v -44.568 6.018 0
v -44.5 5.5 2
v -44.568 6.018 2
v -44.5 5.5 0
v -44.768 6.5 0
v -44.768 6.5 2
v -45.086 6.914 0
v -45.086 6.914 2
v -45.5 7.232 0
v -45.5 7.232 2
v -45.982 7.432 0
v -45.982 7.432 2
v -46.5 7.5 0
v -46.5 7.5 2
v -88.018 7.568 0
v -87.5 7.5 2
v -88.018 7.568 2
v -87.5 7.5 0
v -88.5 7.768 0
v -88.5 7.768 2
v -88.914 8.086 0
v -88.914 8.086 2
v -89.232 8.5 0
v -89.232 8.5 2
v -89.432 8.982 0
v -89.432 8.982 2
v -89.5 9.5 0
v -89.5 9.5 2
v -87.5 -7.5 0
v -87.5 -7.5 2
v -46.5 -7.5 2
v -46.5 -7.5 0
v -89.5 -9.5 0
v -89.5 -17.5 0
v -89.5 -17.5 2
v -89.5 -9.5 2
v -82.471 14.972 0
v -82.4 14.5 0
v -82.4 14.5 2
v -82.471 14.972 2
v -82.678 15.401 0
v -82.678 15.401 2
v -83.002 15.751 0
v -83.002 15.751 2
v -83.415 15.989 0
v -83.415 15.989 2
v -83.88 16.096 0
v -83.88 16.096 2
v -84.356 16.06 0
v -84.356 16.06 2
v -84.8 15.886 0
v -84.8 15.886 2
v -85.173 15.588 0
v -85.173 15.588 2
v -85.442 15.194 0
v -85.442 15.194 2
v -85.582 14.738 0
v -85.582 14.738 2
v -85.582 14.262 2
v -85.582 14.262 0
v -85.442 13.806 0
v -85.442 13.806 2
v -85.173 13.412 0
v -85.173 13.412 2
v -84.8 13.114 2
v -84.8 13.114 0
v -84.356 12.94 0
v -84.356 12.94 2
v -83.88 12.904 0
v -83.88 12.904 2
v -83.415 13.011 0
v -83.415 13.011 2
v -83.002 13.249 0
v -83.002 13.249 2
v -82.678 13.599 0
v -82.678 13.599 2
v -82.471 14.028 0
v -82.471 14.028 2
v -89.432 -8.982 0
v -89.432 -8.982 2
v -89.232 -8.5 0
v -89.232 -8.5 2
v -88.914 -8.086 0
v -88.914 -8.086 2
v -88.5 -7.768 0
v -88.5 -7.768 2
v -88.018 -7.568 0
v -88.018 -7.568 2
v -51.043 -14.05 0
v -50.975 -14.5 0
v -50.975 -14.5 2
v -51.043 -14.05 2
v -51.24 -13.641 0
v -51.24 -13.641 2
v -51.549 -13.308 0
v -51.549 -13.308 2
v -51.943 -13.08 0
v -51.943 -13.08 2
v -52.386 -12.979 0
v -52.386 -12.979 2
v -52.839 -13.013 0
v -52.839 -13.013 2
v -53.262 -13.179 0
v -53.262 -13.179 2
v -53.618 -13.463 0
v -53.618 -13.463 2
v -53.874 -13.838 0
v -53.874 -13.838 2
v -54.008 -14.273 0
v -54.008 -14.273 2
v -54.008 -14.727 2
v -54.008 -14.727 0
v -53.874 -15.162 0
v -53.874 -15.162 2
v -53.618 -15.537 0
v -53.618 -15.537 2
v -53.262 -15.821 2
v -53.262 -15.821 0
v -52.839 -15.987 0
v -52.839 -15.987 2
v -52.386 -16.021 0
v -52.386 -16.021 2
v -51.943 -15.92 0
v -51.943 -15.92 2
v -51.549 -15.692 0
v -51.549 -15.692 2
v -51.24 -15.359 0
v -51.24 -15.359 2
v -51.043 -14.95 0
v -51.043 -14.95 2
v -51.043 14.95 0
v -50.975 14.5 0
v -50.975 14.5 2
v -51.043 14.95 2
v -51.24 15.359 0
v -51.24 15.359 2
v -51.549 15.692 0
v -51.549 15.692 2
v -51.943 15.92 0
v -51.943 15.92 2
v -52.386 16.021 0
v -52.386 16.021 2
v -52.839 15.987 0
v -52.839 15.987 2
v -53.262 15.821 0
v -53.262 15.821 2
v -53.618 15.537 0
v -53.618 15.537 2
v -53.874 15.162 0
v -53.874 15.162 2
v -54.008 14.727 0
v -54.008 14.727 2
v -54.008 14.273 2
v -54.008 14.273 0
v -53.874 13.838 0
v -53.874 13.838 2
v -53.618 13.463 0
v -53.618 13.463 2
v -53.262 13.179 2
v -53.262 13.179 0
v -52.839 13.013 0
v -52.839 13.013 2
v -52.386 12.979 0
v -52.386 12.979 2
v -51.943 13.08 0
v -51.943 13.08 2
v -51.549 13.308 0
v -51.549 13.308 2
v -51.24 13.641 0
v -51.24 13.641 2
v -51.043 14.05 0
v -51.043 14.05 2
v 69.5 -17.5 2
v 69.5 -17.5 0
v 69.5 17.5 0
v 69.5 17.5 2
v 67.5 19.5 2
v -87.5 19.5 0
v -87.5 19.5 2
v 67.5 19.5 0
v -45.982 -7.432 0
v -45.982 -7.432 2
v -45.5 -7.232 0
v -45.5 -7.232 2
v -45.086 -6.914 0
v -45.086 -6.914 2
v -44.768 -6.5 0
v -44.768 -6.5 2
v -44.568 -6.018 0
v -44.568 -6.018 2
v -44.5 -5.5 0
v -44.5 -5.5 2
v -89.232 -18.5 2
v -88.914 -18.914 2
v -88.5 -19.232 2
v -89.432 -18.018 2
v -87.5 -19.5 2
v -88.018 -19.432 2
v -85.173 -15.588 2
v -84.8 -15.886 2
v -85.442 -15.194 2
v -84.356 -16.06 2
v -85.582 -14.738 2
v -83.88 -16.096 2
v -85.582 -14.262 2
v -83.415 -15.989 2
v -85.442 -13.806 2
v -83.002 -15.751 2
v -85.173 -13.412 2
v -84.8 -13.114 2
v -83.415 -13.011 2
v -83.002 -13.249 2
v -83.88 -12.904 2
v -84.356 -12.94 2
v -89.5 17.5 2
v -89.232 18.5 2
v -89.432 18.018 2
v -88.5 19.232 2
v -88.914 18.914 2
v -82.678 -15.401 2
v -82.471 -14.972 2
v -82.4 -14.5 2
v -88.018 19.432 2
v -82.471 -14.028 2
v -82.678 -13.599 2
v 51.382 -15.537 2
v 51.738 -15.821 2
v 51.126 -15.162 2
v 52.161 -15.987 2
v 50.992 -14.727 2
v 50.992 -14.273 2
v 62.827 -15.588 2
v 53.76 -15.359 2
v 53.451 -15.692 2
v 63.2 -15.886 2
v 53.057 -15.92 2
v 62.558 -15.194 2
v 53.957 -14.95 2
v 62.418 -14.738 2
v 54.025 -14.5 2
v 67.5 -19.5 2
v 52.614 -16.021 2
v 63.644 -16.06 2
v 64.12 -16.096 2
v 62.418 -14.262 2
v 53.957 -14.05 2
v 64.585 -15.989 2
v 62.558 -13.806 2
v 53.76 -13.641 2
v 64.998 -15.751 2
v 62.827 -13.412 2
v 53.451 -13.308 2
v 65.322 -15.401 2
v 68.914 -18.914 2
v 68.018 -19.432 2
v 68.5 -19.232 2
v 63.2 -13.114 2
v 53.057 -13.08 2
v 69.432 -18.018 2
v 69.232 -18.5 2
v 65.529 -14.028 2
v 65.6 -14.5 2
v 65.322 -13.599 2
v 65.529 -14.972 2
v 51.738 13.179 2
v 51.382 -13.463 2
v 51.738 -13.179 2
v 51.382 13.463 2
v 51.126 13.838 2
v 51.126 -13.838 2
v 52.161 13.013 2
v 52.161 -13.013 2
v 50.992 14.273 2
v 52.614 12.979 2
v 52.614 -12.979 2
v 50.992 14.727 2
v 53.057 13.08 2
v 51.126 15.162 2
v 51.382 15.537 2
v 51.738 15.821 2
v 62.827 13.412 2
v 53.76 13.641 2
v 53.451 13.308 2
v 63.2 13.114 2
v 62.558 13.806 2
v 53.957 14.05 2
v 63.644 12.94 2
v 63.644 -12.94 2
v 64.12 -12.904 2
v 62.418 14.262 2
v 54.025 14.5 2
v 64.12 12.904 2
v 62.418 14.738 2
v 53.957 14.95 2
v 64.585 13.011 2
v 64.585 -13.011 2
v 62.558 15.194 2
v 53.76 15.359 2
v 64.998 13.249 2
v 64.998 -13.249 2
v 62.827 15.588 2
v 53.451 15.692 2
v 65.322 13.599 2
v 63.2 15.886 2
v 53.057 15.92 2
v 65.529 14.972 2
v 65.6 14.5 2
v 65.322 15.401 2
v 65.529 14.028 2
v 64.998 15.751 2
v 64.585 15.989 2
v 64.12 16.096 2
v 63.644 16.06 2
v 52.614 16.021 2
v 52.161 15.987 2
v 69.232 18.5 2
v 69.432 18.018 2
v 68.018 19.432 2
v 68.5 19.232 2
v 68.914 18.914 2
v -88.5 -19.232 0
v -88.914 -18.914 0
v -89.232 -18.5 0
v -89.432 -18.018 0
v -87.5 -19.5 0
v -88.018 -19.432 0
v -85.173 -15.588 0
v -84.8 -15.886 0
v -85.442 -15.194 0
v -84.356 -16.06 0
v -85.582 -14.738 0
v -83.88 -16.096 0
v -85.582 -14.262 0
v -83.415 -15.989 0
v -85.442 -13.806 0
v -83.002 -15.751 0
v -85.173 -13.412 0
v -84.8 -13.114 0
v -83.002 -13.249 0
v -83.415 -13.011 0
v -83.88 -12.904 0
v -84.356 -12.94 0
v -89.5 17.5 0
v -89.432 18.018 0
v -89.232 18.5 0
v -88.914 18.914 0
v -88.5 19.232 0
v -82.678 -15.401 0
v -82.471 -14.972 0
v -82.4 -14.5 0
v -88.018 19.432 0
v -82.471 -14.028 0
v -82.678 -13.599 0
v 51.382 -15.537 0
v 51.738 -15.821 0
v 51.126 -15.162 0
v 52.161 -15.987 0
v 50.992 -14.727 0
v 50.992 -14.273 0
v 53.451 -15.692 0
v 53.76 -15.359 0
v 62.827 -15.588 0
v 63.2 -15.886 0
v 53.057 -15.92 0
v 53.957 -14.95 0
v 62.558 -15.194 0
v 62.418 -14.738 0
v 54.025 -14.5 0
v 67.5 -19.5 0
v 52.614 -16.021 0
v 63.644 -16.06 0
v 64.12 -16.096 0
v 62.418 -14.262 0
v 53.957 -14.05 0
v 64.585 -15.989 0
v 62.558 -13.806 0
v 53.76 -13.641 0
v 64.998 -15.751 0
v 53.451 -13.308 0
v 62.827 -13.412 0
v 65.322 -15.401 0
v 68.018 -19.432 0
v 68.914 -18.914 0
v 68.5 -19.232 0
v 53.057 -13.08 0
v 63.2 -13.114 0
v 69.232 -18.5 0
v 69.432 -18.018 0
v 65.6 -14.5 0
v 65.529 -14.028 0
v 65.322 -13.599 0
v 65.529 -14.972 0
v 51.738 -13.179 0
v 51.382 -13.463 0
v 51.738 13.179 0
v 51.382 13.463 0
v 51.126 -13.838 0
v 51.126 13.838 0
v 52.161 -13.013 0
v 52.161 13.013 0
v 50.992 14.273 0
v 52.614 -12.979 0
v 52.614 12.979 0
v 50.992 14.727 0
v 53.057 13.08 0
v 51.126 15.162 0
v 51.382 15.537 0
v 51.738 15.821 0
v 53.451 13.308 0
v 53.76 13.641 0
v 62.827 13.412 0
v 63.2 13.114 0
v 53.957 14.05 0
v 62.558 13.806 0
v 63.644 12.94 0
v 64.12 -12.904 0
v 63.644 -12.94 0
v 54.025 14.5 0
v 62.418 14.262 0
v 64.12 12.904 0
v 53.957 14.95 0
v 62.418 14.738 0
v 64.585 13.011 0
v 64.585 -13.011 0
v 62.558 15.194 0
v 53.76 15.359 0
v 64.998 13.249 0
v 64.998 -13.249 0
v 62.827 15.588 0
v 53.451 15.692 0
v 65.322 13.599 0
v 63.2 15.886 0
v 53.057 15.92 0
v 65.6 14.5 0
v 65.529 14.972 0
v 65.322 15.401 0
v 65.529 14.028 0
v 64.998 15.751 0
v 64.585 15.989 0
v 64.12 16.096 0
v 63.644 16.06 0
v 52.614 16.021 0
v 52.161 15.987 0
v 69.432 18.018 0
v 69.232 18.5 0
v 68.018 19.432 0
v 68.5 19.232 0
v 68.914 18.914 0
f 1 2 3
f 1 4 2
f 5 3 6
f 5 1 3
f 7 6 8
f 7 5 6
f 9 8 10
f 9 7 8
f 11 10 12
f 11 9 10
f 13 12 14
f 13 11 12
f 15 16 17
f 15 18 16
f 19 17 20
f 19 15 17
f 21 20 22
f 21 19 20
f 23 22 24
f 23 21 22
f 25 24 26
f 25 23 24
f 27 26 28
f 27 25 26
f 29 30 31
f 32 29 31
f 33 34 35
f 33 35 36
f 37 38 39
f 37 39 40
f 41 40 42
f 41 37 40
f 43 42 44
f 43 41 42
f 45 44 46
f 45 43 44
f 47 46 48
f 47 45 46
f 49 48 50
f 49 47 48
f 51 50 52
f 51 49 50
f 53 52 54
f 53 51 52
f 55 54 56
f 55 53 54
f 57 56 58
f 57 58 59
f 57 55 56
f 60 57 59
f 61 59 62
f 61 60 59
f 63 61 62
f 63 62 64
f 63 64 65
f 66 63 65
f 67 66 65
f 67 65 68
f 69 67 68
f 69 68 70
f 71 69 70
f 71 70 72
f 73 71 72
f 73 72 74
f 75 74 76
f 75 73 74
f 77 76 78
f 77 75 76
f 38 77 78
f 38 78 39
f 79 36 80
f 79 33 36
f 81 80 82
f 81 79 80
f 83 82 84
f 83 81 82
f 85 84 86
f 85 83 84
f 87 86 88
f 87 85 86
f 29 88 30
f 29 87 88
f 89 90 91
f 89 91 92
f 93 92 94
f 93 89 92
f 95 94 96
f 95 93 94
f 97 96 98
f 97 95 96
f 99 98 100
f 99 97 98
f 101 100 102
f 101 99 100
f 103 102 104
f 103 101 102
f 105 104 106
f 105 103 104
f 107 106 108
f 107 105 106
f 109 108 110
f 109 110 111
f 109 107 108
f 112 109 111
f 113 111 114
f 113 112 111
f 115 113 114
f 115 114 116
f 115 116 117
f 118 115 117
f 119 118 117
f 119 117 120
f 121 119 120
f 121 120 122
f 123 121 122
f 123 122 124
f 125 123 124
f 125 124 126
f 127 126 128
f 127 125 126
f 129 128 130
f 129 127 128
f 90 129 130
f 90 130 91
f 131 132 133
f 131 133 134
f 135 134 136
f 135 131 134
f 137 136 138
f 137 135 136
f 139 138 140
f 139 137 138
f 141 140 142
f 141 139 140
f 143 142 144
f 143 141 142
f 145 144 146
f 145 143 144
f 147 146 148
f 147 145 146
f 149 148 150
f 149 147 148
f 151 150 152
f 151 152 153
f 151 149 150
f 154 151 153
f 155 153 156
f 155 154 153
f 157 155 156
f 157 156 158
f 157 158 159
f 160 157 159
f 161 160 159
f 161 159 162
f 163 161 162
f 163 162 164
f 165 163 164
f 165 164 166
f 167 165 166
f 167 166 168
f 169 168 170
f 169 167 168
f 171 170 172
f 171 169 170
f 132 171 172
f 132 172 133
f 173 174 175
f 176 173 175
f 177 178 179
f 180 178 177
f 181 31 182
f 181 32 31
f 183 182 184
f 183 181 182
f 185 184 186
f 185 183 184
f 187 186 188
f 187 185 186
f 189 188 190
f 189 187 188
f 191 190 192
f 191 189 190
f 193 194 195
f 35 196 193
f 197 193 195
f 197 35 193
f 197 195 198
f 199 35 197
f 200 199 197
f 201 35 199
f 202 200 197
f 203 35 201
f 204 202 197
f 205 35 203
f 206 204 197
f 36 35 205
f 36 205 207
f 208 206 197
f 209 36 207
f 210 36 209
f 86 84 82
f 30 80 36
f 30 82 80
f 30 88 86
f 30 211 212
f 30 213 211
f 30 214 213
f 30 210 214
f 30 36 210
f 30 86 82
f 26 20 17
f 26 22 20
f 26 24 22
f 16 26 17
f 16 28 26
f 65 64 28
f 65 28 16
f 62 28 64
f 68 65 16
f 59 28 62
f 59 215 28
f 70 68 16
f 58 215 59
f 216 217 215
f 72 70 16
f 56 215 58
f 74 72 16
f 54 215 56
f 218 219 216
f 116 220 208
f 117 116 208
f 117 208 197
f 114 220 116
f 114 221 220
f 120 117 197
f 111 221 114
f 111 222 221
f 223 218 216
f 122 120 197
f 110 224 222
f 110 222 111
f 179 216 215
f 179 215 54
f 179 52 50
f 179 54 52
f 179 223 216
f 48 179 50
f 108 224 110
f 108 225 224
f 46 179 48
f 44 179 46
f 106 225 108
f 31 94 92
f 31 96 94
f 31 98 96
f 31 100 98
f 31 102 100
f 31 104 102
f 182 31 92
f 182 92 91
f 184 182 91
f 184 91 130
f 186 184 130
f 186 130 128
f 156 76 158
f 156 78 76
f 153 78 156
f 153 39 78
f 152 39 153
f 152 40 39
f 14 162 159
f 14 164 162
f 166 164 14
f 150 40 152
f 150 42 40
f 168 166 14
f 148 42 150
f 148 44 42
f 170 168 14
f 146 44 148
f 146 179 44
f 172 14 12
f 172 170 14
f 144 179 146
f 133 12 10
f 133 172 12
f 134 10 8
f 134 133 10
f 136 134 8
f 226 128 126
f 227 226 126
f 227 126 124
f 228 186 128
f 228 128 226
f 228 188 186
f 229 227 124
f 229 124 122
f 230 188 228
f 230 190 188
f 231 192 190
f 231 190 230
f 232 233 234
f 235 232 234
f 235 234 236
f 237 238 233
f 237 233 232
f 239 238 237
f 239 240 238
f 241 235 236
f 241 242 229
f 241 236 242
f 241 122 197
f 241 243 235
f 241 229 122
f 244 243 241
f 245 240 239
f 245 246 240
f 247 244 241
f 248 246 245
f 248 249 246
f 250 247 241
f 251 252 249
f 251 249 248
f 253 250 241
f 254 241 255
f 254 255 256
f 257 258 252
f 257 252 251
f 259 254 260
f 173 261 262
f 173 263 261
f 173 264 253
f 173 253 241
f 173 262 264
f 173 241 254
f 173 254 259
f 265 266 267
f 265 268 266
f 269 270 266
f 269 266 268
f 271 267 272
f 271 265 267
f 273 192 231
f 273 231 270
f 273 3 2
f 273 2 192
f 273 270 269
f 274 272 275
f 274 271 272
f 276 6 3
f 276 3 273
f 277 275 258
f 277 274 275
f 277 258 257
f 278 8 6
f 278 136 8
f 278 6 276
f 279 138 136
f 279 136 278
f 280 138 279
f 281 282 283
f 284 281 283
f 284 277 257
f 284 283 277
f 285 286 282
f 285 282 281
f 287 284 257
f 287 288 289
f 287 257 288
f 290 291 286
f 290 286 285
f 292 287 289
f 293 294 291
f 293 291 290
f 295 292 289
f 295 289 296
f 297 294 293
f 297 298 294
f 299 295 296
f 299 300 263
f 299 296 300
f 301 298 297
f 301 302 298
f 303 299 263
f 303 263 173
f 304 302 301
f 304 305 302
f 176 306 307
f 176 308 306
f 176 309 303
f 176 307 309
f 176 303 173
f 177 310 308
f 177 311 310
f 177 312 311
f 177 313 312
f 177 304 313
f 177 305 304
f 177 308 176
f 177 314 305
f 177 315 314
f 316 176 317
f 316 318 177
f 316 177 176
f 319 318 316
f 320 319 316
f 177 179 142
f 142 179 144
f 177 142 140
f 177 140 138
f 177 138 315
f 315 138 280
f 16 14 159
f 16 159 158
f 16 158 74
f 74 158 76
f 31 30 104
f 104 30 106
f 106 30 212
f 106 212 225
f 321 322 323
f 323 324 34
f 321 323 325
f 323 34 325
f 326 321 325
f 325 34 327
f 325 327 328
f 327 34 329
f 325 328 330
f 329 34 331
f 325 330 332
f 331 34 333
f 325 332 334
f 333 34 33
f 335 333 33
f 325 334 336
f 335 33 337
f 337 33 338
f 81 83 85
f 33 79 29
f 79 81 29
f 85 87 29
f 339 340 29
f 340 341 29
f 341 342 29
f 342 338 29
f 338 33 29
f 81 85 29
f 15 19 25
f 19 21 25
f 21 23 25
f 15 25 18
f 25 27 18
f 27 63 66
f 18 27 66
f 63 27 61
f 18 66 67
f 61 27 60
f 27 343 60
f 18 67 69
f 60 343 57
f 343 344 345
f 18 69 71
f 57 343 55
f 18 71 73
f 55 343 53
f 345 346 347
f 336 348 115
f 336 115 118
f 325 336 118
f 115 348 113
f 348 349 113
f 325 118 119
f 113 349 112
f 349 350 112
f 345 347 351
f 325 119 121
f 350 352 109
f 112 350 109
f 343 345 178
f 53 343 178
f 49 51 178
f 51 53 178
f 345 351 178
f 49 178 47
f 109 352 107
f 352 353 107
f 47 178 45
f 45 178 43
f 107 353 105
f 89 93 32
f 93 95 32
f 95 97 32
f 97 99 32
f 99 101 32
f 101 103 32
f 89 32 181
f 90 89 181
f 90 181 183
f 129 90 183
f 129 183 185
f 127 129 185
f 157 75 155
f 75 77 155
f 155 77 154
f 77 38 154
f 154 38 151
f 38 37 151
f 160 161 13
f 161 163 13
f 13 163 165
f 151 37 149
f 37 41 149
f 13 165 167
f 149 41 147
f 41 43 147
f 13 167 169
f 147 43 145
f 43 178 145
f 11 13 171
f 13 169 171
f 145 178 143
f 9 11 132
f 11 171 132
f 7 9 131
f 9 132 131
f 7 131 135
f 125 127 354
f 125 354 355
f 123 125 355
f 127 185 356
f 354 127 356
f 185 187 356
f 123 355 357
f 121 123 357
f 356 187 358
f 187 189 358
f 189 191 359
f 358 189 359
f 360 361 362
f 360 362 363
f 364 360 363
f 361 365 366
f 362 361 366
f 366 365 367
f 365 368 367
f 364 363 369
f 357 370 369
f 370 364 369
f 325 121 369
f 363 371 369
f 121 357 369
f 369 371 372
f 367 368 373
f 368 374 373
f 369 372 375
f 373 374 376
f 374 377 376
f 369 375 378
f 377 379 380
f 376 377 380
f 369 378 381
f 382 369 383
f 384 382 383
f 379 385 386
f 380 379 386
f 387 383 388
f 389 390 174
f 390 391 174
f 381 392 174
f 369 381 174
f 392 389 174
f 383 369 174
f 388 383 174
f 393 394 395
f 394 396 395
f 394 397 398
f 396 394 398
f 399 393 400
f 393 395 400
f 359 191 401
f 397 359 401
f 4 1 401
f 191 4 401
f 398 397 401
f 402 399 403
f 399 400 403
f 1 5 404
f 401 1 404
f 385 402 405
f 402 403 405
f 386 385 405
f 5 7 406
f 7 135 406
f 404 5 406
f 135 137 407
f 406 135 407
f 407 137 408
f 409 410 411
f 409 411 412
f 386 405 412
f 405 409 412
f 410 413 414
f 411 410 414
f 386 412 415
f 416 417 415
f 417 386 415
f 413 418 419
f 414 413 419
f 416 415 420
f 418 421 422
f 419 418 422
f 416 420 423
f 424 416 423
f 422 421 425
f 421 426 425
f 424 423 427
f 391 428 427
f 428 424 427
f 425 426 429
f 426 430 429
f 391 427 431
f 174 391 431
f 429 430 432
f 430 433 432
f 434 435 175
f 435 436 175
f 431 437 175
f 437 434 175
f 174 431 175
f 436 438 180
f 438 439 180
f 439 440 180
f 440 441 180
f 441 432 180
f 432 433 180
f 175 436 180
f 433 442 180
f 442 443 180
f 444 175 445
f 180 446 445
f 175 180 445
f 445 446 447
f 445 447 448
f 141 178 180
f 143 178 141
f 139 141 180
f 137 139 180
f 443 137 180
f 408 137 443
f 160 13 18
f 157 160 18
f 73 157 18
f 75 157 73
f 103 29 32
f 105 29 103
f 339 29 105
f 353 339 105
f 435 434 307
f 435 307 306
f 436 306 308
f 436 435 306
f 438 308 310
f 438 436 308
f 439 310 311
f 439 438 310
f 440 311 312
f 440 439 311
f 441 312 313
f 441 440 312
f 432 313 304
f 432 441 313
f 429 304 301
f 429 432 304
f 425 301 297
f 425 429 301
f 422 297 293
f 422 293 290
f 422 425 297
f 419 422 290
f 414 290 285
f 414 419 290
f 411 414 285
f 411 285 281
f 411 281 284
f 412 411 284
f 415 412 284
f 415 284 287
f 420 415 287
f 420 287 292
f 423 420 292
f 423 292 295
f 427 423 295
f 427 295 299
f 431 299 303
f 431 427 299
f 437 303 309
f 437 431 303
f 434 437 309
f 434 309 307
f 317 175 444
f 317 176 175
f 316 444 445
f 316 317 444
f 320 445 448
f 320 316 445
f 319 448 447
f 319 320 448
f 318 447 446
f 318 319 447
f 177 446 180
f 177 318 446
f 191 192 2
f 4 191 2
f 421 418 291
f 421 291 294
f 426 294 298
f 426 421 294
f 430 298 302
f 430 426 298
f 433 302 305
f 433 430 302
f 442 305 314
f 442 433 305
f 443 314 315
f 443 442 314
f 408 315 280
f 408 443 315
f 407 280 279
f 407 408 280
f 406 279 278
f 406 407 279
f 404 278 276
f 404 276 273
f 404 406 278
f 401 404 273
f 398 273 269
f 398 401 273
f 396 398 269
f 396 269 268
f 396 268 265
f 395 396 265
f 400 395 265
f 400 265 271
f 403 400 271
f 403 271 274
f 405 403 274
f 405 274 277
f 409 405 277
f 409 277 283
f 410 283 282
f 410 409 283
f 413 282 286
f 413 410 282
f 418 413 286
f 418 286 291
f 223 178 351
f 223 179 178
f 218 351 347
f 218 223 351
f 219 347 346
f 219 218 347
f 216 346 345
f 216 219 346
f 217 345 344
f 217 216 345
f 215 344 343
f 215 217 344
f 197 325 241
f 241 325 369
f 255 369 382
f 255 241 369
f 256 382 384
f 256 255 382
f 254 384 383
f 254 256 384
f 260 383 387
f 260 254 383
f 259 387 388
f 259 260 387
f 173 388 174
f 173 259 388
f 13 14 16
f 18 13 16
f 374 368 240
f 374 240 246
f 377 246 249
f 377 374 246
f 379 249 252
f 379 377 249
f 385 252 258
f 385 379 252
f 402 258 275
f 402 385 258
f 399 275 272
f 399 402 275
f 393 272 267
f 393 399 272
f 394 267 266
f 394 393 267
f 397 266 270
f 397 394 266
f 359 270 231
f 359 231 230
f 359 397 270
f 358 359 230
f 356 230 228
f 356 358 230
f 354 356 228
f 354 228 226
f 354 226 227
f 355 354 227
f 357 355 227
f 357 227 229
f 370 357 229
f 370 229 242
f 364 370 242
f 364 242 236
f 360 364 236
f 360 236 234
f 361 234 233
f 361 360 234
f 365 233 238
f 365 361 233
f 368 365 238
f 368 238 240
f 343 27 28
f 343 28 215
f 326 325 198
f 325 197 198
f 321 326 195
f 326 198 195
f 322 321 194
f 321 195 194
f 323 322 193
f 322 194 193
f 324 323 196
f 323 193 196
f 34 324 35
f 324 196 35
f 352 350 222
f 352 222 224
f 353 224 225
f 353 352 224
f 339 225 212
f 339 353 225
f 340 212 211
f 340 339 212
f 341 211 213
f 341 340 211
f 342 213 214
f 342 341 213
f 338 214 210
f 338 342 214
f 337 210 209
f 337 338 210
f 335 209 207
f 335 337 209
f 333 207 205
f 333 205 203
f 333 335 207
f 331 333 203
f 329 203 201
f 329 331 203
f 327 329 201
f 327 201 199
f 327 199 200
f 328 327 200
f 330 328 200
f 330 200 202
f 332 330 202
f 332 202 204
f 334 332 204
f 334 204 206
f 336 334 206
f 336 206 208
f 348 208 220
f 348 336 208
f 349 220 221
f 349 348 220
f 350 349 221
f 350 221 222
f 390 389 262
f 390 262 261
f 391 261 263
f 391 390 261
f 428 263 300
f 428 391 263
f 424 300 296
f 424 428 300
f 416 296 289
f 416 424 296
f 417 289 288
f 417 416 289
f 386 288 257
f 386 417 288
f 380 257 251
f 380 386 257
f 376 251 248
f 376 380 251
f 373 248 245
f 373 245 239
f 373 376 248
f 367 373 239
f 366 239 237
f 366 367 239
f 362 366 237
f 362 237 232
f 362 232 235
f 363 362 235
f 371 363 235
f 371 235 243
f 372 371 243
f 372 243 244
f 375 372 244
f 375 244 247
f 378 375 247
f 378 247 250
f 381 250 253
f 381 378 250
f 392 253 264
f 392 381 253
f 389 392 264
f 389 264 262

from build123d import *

# Parameters (mm, degrees)
SKETCH_1_W          = 32
SKETCH_1_H          = 39
SKETCH_1_R          = 1.6
SKETCH_1_W_2        = 115
SKETCH_1_R_2        = 1.525
SKETCH_1_W_3        = 12
EXTRUDE_1_DEPTH     = 2
SKETCH_2_W          = 19
SKETCH_2_H          = 15
SKETCH_2_W_2        = 26
CUT_EXTRUDE_1_DEPTH = 10
FILLET_1_R          = 2


with BuildPart() as part:
    # 草图1 → 凸台-拉伸1 (new body)
    # profile 1 of 3: a face of its own
    with BuildSketch(Plane.XY):
        with Locations((-73.5, 0)):
            Rectangle(SKETCH_1_W, SKETCH_1_H)
        with Locations((-84, -14.5)):
            Circle(SKETCH_1_R, mode=Mode.SUBTRACT)
        with Locations((-84, 14.5)):
            Circle(SKETCH_1_R, mode=Mode.SUBTRACT)
    # profile 2 of 3: a face of its own
    with BuildSketch(Plane.XY):
        Rectangle(SKETCH_1_W_2, SKETCH_1_H)
        with Locations((52.5, 14.5)):
            Circle(SKETCH_1_R_2, mode=Mode.SUBTRACT)
        with Locations((52.5, -14.5)):
            Circle(SKETCH_1_R_2, mode=Mode.SUBTRACT)
        with Locations((-52.5, -14.5)):
            Circle(SKETCH_1_R_2, mode=Mode.SUBTRACT)
        with Locations((-52.5, 14.5)):
            Circle(SKETCH_1_R_2, mode=Mode.SUBTRACT)
    # profile 3 of 3: a face of its own
    with BuildSketch(Plane.XY):
        with Locations((63.5, 0)):
            Rectangle(SKETCH_1_W_3, SKETCH_1_H)
        with Locations((64, -14.5)):
            Circle(SKETCH_1_R, mode=Mode.SUBTRACT)
        with Locations((64, 14.5)):
            Circle(SKETCH_1_R, mode=Mode.SUBTRACT)
    extrude(amount=EXTRUDE_1_DEPTH)

    # 草图2 → 切除-拉伸1 (cut)
    with BuildSketch(Plane.XY.offset(2)):
        with Locations((-80, 0)):
            Rectangle(SKETCH_2_W, SKETCH_2_H)
        with Locations((-57.5, 0)):
            Rectangle(SKETCH_2_W_2, SKETCH_2_H)
    extrude(amount=-CUT_EXTRUDE_1_DEPTH, mode=Mode.SUBTRACT)

    # 圆角1
    fillet_1_edges = [part.edges().sort_by_distance(p)[0] for p in [
        (-89.5, 19.5, 1),
        (69.5, 19.5, 1),
        (69.5, -19.5, 1),
        (-89.5, -19.5, 1),
        (-44.5, -7.5, 1),
        (-89.5, -7.5, 1),
        (-89.5, 7.5, 1),
        (-44.5, 7.5, 1),
    ]]
    fillet(fillet_1_edges, radius=FILLET_1_R)


solid = part.part
